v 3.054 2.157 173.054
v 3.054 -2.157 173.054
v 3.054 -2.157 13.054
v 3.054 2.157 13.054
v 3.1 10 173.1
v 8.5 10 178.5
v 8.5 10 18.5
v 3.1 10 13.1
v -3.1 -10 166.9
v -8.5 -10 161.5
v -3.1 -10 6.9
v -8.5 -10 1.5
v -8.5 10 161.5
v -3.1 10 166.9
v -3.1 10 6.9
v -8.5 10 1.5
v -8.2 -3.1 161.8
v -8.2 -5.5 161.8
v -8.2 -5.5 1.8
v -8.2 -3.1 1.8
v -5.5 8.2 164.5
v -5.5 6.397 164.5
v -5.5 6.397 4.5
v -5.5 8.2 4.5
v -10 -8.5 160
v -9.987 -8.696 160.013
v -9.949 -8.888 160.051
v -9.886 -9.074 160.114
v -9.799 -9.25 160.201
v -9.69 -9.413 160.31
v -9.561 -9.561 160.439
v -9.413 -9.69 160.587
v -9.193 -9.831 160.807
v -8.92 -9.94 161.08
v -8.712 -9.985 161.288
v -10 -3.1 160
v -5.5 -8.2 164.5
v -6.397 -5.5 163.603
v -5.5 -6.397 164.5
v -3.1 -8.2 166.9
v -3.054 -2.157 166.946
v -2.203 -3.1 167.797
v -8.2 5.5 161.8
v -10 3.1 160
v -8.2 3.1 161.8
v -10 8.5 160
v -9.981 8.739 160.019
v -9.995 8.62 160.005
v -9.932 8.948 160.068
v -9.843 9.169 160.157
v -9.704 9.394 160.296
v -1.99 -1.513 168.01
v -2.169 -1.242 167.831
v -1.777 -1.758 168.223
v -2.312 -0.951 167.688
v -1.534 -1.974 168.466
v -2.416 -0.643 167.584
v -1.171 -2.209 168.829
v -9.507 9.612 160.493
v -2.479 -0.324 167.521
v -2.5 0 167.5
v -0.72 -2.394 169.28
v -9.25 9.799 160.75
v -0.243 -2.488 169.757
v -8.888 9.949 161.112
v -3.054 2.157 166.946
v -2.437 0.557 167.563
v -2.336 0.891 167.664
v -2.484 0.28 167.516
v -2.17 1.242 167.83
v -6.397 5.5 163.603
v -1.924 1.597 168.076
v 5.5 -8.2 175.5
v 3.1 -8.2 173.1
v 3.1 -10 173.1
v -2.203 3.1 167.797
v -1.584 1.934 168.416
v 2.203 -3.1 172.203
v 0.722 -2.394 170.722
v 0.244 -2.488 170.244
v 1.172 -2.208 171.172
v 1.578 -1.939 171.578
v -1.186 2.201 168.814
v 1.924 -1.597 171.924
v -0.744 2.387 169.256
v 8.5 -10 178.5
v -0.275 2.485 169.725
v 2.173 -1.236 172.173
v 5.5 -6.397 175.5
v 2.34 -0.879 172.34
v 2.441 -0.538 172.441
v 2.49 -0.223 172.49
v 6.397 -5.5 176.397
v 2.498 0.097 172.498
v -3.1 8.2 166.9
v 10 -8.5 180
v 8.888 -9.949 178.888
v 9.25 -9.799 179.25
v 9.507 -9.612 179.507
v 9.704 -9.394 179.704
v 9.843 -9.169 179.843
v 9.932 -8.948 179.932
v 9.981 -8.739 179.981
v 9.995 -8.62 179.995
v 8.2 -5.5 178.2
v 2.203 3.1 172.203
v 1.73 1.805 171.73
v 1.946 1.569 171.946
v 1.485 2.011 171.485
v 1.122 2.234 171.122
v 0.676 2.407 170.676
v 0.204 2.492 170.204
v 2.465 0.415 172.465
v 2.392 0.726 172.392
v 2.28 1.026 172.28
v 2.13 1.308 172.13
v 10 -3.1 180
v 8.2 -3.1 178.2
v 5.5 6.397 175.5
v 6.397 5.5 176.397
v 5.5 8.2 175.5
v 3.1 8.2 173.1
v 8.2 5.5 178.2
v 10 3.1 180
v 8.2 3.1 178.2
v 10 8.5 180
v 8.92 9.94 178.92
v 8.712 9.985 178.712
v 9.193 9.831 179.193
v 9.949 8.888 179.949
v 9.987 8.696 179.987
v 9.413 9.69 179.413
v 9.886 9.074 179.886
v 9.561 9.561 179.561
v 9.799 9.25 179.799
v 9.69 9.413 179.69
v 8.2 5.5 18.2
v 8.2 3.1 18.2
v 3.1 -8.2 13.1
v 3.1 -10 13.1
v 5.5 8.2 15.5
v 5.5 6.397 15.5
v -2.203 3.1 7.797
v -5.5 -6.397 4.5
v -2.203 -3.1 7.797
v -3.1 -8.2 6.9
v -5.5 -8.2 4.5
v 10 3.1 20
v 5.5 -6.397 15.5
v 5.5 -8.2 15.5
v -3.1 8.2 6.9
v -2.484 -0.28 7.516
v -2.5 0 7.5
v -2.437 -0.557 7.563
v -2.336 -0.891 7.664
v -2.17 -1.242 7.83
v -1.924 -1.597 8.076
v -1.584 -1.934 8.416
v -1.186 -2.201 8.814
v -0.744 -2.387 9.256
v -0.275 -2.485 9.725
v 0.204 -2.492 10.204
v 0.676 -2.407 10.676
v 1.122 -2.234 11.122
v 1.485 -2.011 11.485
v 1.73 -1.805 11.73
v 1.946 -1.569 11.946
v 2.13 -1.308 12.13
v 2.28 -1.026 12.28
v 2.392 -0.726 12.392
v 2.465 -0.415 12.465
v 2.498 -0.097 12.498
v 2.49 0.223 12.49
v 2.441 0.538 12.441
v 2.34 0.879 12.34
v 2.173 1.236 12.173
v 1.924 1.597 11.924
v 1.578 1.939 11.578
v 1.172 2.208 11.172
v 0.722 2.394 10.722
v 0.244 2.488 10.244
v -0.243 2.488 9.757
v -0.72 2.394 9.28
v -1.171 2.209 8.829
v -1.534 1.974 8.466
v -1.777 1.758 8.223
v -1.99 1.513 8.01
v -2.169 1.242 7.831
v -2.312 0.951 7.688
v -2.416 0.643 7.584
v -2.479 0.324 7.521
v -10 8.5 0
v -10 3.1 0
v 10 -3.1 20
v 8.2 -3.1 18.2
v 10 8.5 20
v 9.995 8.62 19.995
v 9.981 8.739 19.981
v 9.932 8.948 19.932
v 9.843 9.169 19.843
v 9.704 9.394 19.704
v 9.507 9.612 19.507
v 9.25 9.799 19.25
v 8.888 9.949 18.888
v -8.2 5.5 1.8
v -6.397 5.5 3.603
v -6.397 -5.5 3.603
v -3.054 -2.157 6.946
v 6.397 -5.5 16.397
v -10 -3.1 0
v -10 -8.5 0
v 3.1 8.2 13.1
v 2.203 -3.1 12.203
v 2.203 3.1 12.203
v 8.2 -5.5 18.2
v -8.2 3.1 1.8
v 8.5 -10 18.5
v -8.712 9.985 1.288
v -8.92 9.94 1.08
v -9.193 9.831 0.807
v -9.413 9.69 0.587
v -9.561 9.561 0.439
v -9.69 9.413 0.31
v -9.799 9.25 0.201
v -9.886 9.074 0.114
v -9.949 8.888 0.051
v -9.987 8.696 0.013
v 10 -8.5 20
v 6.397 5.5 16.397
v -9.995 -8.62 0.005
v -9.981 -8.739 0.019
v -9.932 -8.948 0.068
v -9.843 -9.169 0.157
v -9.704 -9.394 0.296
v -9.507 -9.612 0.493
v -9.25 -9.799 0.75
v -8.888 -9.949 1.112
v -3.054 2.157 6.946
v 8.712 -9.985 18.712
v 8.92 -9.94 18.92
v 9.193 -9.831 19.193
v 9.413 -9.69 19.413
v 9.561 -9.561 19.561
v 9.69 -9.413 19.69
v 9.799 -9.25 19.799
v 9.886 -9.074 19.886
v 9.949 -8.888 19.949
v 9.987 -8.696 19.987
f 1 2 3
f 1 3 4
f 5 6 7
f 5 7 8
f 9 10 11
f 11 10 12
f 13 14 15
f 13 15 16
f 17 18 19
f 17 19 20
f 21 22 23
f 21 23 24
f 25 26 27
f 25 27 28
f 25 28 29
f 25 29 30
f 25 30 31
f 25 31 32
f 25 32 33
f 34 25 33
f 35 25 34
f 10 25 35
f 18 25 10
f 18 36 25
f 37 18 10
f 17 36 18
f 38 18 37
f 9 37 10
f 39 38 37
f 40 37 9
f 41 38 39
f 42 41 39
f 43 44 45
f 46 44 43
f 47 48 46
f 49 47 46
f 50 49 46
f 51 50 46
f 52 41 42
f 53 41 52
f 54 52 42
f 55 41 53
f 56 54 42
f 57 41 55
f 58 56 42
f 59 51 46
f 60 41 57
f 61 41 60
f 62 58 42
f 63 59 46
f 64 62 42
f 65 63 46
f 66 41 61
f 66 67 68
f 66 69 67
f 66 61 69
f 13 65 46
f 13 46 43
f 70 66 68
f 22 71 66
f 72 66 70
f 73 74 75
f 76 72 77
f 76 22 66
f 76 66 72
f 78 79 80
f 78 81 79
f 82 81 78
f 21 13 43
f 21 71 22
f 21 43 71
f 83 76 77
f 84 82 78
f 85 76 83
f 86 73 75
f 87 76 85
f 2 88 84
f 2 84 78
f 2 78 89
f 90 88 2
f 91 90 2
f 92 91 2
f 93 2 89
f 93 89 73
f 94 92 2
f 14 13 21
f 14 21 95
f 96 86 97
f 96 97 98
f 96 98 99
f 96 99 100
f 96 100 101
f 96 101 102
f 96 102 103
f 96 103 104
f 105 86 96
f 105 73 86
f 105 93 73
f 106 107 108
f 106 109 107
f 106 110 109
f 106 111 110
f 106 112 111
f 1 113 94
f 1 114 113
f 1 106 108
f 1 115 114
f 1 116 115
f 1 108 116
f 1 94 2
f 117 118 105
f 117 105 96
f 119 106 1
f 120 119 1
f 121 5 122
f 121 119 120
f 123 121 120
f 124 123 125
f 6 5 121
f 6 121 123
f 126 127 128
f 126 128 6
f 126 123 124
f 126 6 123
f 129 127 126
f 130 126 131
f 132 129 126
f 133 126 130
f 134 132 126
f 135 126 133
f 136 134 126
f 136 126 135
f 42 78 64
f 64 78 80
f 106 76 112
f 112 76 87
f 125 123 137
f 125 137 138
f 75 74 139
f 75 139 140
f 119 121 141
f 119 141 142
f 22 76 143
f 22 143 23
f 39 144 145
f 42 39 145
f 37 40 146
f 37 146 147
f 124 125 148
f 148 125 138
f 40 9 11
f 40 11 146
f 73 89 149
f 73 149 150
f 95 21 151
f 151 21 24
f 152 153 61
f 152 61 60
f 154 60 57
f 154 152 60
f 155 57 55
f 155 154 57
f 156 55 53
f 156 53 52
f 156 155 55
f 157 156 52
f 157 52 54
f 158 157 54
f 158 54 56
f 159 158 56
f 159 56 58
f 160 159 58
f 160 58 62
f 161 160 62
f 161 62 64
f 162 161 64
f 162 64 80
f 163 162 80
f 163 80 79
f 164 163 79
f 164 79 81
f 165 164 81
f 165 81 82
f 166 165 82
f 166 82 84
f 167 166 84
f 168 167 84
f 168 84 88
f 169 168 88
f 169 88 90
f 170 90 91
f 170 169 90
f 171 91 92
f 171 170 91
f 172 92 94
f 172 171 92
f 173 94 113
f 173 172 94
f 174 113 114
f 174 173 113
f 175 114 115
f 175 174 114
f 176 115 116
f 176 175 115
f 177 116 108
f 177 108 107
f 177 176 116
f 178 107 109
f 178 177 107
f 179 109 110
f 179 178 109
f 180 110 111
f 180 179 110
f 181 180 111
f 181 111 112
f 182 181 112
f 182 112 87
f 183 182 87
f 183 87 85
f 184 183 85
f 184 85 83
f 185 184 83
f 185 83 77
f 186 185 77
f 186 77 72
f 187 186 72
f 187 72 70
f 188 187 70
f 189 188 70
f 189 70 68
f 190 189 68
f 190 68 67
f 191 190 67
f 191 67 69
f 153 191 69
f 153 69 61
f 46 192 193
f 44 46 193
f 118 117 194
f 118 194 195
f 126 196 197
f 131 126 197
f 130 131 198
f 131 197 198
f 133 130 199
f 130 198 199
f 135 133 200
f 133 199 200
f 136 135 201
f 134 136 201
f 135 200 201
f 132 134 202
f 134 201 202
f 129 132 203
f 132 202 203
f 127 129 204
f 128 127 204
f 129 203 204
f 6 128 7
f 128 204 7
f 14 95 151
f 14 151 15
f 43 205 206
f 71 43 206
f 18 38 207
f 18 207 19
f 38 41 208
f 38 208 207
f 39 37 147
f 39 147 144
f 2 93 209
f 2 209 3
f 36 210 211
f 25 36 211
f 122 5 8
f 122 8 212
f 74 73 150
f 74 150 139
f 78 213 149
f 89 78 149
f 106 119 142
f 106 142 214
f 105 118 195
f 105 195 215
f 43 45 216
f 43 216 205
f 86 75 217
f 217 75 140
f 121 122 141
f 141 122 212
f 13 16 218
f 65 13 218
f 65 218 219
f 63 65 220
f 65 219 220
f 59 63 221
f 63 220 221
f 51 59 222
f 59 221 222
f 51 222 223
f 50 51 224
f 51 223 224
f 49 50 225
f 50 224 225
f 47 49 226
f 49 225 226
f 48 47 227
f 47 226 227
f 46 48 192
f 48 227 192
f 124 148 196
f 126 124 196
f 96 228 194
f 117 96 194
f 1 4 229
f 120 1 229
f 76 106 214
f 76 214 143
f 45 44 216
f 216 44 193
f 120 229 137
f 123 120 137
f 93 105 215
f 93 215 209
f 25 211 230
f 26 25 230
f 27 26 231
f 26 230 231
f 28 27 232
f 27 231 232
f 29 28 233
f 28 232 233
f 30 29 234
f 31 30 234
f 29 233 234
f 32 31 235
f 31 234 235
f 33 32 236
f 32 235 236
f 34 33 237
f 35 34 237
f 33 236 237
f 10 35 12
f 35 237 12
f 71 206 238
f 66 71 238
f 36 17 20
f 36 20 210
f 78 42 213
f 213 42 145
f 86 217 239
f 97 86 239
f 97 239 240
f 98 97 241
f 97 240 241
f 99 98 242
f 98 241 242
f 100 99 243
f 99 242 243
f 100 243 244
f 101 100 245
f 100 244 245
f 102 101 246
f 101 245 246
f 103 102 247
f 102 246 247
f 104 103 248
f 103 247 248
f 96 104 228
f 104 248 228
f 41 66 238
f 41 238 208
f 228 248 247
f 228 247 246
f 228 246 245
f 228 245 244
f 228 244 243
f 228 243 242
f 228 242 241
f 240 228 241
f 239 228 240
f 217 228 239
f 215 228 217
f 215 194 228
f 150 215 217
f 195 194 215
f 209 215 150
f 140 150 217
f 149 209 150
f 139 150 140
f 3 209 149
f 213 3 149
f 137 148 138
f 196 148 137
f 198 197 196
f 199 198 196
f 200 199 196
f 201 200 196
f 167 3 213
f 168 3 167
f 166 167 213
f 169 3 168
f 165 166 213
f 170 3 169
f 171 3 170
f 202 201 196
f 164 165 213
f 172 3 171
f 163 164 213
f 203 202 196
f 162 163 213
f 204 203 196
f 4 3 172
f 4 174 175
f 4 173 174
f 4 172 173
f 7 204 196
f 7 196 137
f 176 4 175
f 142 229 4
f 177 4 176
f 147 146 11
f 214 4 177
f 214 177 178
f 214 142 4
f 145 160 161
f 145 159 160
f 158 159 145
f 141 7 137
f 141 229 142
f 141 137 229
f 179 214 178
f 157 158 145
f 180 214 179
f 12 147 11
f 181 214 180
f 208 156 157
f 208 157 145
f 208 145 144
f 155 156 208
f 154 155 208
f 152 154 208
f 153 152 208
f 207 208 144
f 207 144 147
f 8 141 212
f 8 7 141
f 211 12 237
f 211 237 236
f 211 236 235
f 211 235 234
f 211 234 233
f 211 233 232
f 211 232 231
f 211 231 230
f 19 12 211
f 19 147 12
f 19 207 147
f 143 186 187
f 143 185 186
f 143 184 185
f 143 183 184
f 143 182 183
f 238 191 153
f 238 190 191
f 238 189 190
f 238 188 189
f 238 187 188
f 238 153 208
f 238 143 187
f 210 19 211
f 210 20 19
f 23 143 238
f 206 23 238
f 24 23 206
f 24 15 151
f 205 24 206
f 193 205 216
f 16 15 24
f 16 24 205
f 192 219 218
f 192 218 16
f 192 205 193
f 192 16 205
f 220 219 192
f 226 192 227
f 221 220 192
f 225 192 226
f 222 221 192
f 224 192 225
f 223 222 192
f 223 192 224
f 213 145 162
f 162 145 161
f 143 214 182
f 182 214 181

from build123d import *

# Parameters (mm, degrees)
SKETCH_1_R          = 2.5
EXTRUDE_1_DEPTH     = 180
CUT_EXTRUDE_1_DEPTH = 182.383571472


with BuildPart() as part:
    # 草图1 → 凸台-拉伸1 (new body)
    with BuildSketch(Plane.XY):
        with BuildLine():
            Line((-8.2, -3.1), (-10, -3.1))
            Line((-10, -3.1), (-10, -8.5))
            ThreePointArc((-10, -8.5), (-9.560660172, -9.560660172), (-8.5, -10))
            Line((-8.5, -10), (-3.1, -10))
            Line((-3.1, -10), (-3.1, -8.2))
            Line((-3.1, -8.2), (-5.5, -8.2))
            Line((-5.5, -8.2), (-5.5, -6.397050155))
            Line((-5.5, -6.397050155), (-2.202949845, -3.1))
            Line((-2.202949845, -3.1), (2.202949845, -3.1))
            Line((2.202949845, -3.1), (5.5, -6.397050155))
            Line((5.5, -6.397050155), (5.5, -8.2))
            Line((5.5, -8.2), (3.1, -8.2))
            Line((3.1, -8.2), (3.1, -10))
            Line((3.1, -10), (8.5, -10))
            ThreePointArc((8.5, -10), (9.560660172, -9.560660172), (10, -8.5))
            Line((10, -8.5), (10, -3.1))
            Line((10, -3.1), (8.2, -3.1))
            Line((8.2, -3.1), (8.2, -5.5))
            Line((8.2, -5.5), (6.397050155, -5.5))
            Line((6.397050155, -5.5), (3.05412702, -2.157076865))
            Line((3.05412702, -2.157076865), (3.05412702, 2.157076865))
            Line((3.05412702, 2.157076865), (6.397050155, 5.5))
            Line((6.397050155, 5.5), (8.2, 5.5))
            Line((8.2, 5.5), (8.2, 3.1))
            Line((8.2, 3.1), (10, 3.1))
            Line((10, 3.1), (10, 8.5))
            ThreePointArc((10, 8.5), (9.560660172, 9.560660172), (8.5, 10))
            Line((8.5, 10), (3.1, 10))
            Line((3.1, 10), (3.1, 8.2))
            Line((3.1, 8.2), (5.5, 8.2))
            Line((5.5, 8.2), (5.5, 6.397050155))
            Line((5.5, 6.397050155), (2.202949845, 3.1))
            Line((2.202949845, 3.1), (-2.202949845, 3.1))
            Line((-2.202949845, 3.1), (-5.5, 6.397050155))
            Line((-5.5, 6.397050155), (-5.5, 8.2))
            Line((-5.5, 8.2), (-3.1, 8.2))
            Line((-3.1, 8.2), (-3.1, 10))
            Line((-3.1, 10), (-8.5, 10))
            ThreePointArc((-8.5, 10), (-9.560660172, 9.560660172), (-10, 8.5))
            Line((-10, 8.5), (-10, 3.1))
            Line((-10, 3.1), (-8.2, 3.1))
            Line((-8.2, 3.1), (-8.2, 5.5))
            Line((-8.2, 5.5), (-6.397050155, 5.5))
            Line((-6.397050155, 5.5), (-3.05412702, 2.157076865))
            Line((-3.05412702, 2.157076865), (-3.05412702, -2.157076865))
            Line((-3.05412702, -2.157076865), (-6.397050155, -5.5))
            Line((-6.397050155, -5.5), (-8.2, -5.5))
            Line((-8.2, -5.5), (-8.2, -3.1))
        make_face()
        with Locations(Location((0, 0, 0), (0, 0, 180))):
            Circle(SKETCH_1_R, mode=Mode.SUBTRACT)
    extrude(amount=EXTRUDE_1_DEPTH)

    # 草图2 → 切除-拉伸1 (cut, through all)
    with BuildSketch(Plane(origin=(0, 10, 0), x_dir=(1, 0, 0), z_dir=(0, 1, 0))):
        Polygon((-10, 0), (10, 0), (10, -20), align=None)
        Polygon((-10, -180), (-10, -160), (10, -180), align=None)
    extrude(amount=-CUT_EXTRUDE_1_DEPTH, mode=Mode.SUBTRACT)


solid = part.part
